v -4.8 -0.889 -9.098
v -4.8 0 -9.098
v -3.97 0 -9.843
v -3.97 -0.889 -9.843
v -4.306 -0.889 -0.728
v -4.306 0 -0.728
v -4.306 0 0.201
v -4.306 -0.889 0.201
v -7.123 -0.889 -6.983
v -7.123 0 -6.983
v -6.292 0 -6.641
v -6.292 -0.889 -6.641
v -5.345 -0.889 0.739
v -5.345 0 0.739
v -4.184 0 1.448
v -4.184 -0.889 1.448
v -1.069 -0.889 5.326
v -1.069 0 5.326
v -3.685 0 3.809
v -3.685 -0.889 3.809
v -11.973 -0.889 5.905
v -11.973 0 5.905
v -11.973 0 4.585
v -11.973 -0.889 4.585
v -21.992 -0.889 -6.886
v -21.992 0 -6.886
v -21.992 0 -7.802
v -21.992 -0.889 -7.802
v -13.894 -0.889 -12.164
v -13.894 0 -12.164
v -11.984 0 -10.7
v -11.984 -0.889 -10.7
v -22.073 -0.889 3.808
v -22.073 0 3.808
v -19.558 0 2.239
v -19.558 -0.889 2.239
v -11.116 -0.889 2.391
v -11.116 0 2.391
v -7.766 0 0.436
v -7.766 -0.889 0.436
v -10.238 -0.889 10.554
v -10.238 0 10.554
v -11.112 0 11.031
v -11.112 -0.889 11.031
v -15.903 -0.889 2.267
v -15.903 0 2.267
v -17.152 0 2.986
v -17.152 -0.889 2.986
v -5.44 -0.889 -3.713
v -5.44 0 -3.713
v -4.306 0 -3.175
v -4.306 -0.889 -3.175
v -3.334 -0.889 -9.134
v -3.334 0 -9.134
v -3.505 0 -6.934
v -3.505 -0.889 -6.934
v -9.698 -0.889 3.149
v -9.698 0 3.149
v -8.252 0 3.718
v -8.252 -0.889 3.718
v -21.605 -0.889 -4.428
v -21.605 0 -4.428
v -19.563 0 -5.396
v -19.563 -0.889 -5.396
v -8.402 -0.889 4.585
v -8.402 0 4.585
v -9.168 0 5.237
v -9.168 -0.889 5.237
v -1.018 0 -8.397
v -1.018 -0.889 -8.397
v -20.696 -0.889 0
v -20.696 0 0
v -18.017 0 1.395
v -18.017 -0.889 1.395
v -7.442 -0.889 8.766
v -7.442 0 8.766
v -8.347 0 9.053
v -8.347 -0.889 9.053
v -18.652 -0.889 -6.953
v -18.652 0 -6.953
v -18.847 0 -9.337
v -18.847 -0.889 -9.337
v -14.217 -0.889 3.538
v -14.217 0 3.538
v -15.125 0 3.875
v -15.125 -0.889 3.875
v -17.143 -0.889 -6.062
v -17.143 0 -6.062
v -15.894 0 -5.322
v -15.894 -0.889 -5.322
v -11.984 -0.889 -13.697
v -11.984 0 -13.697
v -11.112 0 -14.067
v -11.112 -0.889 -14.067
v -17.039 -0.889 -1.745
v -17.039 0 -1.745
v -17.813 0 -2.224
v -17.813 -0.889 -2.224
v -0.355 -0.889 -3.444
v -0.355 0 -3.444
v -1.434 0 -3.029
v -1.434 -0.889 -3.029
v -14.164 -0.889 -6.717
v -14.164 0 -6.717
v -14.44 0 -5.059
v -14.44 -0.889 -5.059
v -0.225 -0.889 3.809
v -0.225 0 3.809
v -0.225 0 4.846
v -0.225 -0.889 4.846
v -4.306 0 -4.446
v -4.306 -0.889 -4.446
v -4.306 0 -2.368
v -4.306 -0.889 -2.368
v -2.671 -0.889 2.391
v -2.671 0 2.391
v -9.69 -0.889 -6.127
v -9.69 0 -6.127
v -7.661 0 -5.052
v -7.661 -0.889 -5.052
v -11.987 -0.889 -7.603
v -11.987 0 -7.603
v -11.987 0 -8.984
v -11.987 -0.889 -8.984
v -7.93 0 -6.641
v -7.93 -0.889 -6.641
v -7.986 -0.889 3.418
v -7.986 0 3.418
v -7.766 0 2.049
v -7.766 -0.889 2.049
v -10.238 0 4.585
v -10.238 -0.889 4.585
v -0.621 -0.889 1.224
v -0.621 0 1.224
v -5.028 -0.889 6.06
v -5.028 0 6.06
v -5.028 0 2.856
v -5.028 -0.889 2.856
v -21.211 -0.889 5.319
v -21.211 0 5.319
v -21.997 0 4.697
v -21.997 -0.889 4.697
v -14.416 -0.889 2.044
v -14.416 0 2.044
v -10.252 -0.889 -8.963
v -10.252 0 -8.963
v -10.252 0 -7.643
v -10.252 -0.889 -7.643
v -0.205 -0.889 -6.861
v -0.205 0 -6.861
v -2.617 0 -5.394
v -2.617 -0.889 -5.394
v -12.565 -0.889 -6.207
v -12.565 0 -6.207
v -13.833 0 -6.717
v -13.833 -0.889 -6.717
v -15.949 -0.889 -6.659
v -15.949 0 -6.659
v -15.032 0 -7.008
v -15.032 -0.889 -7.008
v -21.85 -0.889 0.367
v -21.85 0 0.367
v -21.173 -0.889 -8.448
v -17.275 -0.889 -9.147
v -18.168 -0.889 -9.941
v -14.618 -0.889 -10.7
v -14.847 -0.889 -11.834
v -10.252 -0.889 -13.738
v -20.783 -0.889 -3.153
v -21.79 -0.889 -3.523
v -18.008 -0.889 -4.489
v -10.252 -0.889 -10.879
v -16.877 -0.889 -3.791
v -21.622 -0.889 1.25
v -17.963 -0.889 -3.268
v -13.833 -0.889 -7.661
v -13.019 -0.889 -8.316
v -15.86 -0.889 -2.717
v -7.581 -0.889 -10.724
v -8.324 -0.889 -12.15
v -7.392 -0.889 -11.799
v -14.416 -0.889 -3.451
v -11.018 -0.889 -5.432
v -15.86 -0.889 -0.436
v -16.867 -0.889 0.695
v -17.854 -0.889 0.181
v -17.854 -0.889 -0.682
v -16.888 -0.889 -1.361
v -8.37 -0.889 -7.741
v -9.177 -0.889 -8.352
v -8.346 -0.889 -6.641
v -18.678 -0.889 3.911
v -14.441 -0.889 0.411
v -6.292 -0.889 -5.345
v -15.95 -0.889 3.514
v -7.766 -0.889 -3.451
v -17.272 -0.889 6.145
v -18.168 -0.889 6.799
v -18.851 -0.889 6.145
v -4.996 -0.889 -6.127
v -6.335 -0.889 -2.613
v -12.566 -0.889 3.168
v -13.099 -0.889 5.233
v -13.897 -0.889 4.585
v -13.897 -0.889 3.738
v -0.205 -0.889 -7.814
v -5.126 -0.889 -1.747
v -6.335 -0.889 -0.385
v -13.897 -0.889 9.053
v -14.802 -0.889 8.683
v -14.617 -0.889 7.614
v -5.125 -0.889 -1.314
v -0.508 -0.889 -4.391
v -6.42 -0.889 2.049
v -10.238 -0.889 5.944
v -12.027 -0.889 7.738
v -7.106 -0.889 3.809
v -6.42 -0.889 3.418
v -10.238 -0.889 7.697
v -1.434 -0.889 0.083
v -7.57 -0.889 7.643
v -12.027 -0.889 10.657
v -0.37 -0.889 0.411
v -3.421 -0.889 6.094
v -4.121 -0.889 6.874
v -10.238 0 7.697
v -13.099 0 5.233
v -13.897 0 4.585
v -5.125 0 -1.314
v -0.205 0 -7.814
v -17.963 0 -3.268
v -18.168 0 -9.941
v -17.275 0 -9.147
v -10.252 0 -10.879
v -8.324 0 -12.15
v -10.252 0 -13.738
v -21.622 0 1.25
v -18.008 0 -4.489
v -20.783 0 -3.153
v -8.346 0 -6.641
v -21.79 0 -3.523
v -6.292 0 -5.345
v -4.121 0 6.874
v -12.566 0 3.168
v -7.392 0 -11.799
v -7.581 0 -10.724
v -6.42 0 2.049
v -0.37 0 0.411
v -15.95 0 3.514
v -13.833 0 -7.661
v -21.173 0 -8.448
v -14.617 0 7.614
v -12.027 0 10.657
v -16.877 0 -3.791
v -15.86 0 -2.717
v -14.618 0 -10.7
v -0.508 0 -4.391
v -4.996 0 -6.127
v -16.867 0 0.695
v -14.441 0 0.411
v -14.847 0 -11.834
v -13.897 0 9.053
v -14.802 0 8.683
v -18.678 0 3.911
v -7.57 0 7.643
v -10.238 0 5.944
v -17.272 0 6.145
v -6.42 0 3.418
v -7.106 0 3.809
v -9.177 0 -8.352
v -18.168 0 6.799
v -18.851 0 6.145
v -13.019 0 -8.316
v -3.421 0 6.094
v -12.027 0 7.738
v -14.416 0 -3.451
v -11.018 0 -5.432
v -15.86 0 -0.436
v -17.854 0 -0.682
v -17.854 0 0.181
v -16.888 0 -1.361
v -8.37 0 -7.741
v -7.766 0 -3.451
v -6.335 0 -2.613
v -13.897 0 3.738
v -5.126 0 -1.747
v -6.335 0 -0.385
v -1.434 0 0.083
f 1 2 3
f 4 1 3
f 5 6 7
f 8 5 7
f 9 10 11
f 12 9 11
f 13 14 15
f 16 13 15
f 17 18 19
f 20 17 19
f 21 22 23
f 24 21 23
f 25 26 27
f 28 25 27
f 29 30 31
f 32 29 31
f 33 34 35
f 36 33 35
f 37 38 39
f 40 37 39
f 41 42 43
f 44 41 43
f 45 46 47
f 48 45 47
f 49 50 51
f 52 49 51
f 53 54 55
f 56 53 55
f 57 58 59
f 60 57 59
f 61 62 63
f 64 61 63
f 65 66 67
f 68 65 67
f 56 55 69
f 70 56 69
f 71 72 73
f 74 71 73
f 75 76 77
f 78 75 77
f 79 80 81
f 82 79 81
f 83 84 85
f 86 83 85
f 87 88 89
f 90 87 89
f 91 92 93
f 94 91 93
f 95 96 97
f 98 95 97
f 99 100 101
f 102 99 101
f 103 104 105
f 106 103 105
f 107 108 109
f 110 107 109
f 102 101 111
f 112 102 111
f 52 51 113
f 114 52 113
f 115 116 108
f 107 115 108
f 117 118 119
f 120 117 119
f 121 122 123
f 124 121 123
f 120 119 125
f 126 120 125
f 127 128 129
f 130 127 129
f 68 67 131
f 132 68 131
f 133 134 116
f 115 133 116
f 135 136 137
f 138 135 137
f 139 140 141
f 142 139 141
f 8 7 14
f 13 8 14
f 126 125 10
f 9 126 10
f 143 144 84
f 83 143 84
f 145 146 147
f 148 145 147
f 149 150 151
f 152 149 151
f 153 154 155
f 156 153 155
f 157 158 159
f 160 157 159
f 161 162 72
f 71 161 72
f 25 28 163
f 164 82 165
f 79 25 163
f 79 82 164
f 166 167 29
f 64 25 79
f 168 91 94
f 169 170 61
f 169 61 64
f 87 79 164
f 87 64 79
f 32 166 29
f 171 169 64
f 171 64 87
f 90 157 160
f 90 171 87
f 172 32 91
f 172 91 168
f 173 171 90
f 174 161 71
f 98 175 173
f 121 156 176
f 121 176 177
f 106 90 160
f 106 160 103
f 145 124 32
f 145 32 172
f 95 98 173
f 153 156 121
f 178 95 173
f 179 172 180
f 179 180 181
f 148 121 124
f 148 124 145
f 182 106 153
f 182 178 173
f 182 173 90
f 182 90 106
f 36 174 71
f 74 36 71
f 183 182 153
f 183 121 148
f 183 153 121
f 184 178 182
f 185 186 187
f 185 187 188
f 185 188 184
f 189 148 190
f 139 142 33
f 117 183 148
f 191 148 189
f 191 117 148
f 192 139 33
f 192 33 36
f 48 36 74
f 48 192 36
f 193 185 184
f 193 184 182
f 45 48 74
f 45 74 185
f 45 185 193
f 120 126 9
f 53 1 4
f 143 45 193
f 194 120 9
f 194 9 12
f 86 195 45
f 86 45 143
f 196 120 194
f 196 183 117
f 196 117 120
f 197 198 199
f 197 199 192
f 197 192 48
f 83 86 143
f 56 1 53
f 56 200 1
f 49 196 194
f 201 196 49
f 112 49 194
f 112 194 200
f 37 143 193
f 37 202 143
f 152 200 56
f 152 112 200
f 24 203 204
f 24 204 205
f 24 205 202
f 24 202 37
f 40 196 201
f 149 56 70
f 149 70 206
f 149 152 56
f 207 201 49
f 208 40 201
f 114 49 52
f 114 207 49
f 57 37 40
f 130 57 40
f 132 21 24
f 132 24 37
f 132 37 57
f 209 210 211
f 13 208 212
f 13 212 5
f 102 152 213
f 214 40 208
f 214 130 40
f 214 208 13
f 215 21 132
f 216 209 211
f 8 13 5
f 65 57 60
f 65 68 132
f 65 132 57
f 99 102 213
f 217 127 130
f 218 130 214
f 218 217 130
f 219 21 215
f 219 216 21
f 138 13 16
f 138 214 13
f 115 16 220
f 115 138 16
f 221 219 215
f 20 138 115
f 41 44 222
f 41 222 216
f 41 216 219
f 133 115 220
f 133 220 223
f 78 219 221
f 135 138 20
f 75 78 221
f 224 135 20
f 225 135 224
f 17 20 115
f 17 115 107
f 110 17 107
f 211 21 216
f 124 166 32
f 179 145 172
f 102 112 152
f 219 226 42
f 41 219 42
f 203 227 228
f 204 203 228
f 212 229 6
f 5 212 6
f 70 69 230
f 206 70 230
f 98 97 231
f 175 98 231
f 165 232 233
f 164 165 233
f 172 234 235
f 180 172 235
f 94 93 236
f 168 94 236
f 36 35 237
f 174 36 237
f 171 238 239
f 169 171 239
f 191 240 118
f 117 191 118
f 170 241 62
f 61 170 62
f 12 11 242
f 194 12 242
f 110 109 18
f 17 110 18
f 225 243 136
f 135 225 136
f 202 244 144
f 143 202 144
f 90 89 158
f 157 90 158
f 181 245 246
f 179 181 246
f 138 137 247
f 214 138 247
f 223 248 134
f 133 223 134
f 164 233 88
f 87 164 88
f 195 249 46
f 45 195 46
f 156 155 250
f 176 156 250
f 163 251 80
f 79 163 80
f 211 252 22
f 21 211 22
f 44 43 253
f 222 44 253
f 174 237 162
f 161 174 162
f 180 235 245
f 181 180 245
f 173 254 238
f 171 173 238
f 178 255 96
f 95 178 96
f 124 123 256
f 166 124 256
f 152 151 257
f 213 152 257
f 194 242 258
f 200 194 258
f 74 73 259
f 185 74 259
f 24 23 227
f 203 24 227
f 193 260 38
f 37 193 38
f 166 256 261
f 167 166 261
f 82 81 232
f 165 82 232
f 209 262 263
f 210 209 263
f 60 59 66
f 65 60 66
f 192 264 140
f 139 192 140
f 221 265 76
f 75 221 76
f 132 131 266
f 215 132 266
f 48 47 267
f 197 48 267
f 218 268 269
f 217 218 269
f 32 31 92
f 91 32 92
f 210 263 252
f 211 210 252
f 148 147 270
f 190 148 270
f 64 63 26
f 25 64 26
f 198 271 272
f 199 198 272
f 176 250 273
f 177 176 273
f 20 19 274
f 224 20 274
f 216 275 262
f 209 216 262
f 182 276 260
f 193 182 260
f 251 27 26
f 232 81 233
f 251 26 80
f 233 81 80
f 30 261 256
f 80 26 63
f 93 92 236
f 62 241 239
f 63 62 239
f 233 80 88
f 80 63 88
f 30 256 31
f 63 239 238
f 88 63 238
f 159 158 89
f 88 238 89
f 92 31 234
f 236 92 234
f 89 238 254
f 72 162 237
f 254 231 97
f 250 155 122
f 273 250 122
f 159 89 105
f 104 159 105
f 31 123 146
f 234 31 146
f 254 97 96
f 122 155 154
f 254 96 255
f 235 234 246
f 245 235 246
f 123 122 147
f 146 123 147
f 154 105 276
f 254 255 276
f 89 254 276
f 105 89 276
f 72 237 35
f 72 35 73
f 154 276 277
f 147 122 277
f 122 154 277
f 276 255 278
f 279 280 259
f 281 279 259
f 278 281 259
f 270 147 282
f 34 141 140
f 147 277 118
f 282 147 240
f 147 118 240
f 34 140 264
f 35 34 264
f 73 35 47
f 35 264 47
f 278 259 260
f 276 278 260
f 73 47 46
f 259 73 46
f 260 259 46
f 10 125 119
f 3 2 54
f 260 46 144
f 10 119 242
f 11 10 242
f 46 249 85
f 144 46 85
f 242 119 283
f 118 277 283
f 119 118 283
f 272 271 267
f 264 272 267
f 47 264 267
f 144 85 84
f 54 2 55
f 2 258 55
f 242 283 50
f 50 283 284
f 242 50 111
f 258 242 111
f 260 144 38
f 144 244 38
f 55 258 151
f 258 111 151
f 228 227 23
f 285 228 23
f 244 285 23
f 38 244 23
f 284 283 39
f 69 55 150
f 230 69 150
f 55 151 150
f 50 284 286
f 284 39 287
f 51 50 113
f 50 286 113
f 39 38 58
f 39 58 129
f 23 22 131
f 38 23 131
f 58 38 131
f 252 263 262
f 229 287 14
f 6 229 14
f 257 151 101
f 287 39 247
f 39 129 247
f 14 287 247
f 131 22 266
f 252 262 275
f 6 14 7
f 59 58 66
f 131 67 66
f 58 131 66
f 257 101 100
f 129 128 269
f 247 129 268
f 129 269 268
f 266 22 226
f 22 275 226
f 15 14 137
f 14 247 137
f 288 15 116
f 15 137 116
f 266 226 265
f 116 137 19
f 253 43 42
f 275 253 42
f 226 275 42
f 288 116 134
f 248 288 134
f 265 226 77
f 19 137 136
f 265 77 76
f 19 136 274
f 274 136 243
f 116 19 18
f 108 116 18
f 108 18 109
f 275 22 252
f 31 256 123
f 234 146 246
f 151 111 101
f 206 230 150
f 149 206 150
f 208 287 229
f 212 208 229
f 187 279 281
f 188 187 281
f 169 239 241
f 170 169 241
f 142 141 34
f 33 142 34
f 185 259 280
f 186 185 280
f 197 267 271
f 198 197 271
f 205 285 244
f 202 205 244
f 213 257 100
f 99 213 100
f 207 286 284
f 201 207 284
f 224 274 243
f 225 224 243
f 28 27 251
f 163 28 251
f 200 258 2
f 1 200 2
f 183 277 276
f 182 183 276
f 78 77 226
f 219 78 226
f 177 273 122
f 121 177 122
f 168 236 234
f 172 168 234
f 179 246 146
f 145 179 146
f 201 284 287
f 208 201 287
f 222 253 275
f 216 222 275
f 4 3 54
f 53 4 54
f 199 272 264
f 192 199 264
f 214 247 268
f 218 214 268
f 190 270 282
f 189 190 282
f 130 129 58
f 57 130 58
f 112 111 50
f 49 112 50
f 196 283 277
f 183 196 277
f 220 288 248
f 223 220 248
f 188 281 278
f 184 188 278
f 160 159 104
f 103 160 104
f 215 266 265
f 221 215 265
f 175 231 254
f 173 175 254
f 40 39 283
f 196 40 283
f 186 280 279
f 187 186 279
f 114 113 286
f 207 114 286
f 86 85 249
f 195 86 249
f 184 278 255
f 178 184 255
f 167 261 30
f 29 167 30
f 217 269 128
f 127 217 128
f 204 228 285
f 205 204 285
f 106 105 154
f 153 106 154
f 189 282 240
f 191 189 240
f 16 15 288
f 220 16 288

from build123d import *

# Parameters (mm, degrees)
F1_DEPTH = 0.889


with BuildPart() as f1:
    # F0 (on Front) → F1 (new body)
    with BuildSketch(Plane.XZ):
        Polygon((-7.766421, 2.049147), (-9.697749, 3.149271), (-8.251928, 3.717801), (-8.401837, 4.58542), (-9.168207, 5.237091), (-10.238115, 4.58542), (-10.238115, 5.944121), (-7.570077, 7.6432), (-7.442288, 8.765532), (-8.34682, 9.053338), (-10.238115, 7.696539), (-10.238115, 10.554039), (-11.1125, 11.030715), (-12.026622, 10.656827), (-12.026622, 7.737654), (-13.897186, 9.053338), (-14.801892, 8.683302), (-14.616874, 7.614309), (-11.972634, 5.904664), (-11.972634, 4.58542), (-13.099057, 5.233018), (-13.897186, 4.58542), (-13.897186, 3.738368), (-12.566103, 3.167905), (-14.415789, 2.044265), (-14.217429, 3.537872), (-15.124985, 3.874964), (-15.949978, 3.513755), (-15.90289, 2.267294), (-17.152183, 2.986197), (-17.271507, 6.144799), (-18.168139, 6.798936), (-18.851348, 6.144799), (-18.678295, 3.910622), (-21.210807, 5.319494), (-21.997354, 4.69717), (-22.072788, 3.808485), (-19.557991, 2.238555), (-21.62216, 1.25008), (-21.850014, 0.367141), (-20.696388, 0), (-18.017134, 1.395444), (-16.867385, 0.695083), (-17.854148, 0.181145), (-17.854148, -0.682273), (-16.887943, -1.360672), (-15.860065, -0.435582), (-15.860065, -2.717471), (-17.038523, -1.745301), (-17.813032, -2.224089), (-17.962941, -3.267605), (-16.876877, -3.790525), (-18.007542, -4.489482), (-20.782813, -3.153241), (-21.790132, -3.523277), (-21.605115, -4.427809), (-19.562521, -5.39587), (-21.992089, -6.886292), (-21.992089, -7.802464), (-21.173319, -8.447639), (-18.651634, -6.953308), (-18.847212, -9.336909), (-18.167692, -9.941154), (-17.27537, -9.146621), (-17.142811, -6.062488), (-15.893939, -5.322416), (-15.948845, -6.659137), (-15.032252, -7.007643), (-14.164055, -6.716586), (-14.440246, -5.05889), (-12.565052, -6.207264), (-13.832696, -6.716586), (-13.832696, -7.661451), (-13.018659, -8.315589), (-11.986575, -7.603306), (-11.986575, -8.984262), (-14.617661, -10.699556), (-14.847309, -11.83401), (-13.893868, -12.164047), (-11.984149, -10.699556), (-11.984149, -13.696965), (-11.1125, -14.067002), (-10.252469, -13.738081), (-10.252469, -10.878737), (-8.323933, -12.14982), (-7.392148, -11.79901), (-7.580517, -10.724198), (-10.252469, -8.963136), (-10.252469, -7.642987), (-9.176794, -8.351956), (-8.370036, -7.740776), (-8.345589, -6.640652), (-9.690185, -6.127262), (-7.661067, -5.051585), (-7.929987, -6.640652), (-7.123229, -6.982913), (-6.292025, -6.640652), (-6.292025, -5.344951), (-4.996324, -6.127262), (-4.800489, -9.098248), (-3.969542, -9.843235), (-3.333915, -9.134266), (-3.505045, -6.934019), (-1.017748, -8.396618), (-0.204675, -7.814118), (-0.204675, -6.860677), (-2.616602, -5.393827), (-0.508032, -4.391492), (-0.355237, -3.444164), (-1.433989, -3.028562), (-4.306216, -4.446499), (-5.440253, -3.713083), (-4.306216, -3.175245), (-4.306216, -2.368488), (-5.126319, -1.7468), (-6.335333, -2.61296), (-6.335333, -0.385276), (-5.125197, -1.31427), (-4.306216, -0.727537), (-4.306216, 0.201456), (-5.345222, 0.739294), (-4.18398, 1.448263), (-1.433989, 0.083229), (-0.370219, 0.411185), (-0.620721, 1.223725), (-2.670654, 2.391408), (-0.225309, 3.809345), (-0.225309, 4.845845), (-1.068589, 5.326194), (-3.684515, 3.809345), (-3.420916, 6.093763), (-4.120606, 6.873983), (-5.028335, 6.059946), (-5.028335, 2.855904), (-6.419651, 2.049147), (-6.419651, 3.41819), (-7.106347, 3.809345), (-7.986446, 3.41819), align=None)
        Polygon((-14.416056, -3.451471), (-14.440504, 0.411185), (-11.115686, 2.391408), (-7.766421, 0.435633), (-7.766421, -3.451471), (-11.017897, -5.431693), align=None, mode=Mode.SUBTRACT)
    extrude(amount=F1_DEPTH)


solid = f1.part
